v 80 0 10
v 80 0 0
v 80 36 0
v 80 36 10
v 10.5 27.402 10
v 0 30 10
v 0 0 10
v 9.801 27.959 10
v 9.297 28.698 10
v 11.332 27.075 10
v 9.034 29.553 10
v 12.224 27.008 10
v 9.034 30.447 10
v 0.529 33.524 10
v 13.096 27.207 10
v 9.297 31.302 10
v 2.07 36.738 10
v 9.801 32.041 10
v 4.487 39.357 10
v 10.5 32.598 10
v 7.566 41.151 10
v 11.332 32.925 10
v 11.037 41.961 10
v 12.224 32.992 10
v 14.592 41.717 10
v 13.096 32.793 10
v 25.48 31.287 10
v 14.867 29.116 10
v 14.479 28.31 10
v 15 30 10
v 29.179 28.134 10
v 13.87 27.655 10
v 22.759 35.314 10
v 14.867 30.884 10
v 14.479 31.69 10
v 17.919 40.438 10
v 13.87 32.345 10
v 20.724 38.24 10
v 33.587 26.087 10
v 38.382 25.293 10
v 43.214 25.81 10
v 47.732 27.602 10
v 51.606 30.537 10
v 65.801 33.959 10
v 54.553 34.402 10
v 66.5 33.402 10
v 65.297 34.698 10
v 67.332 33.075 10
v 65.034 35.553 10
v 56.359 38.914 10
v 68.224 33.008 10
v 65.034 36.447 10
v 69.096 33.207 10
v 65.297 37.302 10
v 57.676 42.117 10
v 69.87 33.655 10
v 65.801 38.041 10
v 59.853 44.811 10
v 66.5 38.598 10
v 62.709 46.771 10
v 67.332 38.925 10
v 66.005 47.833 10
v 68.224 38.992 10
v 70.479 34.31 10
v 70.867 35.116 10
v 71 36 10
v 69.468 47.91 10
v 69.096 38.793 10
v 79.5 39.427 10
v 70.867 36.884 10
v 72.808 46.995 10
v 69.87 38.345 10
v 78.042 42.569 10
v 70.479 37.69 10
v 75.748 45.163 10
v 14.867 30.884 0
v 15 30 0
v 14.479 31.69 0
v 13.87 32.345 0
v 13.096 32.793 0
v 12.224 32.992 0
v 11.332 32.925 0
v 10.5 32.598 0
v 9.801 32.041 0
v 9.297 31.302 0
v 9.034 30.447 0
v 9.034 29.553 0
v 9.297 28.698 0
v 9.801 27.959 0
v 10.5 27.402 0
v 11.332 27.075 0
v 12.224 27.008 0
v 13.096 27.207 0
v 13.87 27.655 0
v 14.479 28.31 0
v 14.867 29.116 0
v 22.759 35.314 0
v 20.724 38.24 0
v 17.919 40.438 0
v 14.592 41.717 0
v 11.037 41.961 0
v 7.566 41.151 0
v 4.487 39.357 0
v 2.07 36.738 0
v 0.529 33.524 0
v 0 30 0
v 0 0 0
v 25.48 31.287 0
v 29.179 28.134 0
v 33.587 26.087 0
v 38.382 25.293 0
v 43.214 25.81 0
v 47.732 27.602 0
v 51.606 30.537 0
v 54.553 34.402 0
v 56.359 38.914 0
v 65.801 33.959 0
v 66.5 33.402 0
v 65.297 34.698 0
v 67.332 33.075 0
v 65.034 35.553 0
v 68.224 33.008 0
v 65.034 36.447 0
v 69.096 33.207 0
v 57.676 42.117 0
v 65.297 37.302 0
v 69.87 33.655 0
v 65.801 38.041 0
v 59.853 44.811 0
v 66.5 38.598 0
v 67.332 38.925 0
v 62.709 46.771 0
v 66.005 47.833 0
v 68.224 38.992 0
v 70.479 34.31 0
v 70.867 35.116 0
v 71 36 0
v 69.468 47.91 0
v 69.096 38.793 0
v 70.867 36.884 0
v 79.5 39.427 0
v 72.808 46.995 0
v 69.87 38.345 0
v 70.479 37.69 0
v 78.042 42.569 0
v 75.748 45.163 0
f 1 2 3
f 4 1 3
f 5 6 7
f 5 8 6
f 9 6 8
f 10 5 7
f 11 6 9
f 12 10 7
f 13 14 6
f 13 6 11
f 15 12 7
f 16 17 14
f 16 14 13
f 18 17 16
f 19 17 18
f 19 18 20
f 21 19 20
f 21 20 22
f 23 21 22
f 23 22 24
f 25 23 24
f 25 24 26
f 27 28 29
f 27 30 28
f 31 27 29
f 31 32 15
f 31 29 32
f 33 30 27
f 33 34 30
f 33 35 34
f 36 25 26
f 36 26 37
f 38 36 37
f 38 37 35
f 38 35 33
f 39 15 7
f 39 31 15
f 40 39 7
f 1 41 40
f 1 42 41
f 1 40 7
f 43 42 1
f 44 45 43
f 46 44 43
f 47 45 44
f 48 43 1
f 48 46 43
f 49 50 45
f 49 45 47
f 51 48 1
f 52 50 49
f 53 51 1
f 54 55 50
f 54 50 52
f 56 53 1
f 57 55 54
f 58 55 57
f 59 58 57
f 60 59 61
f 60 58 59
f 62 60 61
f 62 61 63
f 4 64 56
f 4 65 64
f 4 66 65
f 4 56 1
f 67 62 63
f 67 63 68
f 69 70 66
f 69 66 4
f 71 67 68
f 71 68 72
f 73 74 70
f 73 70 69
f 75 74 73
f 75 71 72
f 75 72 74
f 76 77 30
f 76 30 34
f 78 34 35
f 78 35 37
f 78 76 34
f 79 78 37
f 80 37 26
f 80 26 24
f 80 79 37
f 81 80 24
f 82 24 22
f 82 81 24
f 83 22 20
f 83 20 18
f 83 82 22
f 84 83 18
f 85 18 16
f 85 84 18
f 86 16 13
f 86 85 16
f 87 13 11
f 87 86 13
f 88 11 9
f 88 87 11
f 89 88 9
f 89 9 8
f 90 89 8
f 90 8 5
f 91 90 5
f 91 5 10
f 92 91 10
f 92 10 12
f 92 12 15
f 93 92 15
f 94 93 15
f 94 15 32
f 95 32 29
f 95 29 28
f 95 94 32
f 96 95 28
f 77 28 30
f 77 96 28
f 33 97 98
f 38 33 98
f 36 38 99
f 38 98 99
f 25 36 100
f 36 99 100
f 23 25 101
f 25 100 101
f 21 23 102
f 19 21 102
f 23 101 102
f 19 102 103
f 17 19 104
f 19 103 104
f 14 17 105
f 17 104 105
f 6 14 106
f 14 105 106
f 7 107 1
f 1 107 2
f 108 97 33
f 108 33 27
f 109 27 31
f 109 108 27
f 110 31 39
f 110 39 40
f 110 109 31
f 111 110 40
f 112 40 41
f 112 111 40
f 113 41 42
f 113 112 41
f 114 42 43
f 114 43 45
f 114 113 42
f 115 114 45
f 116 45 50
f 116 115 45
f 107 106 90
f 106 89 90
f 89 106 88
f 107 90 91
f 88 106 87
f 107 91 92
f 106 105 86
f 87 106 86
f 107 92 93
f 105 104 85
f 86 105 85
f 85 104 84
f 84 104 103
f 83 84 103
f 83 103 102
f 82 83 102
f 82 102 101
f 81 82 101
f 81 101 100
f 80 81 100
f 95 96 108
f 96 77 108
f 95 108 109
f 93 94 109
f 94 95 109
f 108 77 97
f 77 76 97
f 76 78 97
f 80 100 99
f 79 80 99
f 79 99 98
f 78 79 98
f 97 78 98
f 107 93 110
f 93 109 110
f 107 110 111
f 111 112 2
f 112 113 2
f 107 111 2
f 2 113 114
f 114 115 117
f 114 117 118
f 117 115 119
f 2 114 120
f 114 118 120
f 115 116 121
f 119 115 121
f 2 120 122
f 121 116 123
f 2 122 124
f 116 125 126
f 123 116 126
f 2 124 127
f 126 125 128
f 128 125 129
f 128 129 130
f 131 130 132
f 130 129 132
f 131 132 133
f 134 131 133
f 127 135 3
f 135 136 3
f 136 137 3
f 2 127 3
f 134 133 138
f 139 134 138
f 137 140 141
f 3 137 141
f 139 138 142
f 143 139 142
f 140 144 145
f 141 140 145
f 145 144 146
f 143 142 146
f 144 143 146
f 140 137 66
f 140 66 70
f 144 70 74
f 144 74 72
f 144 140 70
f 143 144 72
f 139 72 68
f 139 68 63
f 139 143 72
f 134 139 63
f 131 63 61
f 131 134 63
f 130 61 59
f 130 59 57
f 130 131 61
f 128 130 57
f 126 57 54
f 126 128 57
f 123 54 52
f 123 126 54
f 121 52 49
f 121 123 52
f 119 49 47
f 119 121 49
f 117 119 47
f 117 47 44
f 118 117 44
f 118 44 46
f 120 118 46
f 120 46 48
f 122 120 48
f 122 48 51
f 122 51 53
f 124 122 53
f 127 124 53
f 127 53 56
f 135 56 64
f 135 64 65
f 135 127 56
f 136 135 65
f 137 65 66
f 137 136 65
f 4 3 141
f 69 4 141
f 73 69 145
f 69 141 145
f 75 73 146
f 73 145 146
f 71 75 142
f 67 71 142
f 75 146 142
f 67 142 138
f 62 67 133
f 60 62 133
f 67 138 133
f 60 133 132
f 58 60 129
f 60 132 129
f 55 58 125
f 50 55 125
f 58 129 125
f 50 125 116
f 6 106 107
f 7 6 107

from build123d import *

# Parameters (mm, degrees)
SKETCH_R  = 3
PAD_DEPTH = 10


with BuildPart() as part:
    # Sketch → Pad (new body)
    with BuildSketch(Plane.XY):
        with BuildLine():
            Line((0, 0), (80, 0))
            Line((80, 0), (80, 36))
            ThreePointArc((80, 36), (69.46807, 47.90986), (56.359205, 38.914086))
            ThreePointArc((22.759205, 35.314086), (40.815609, 25.387649), (56.359205, 38.914086))
            ThreePointArc((22.759205, 35.314086), (9.27149, 41.685685), (0, 30))
            Line((0, 30), (0, 0))
        make_face()
        with Locations((68, 36)):
            Circle(SKETCH_R, mode=Mode.SUBTRACT)
        with Locations((12, 30)):
            Circle(SKETCH_R, mode=Mode.SUBTRACT)
    extrude(amount=PAD_DEPTH)


solid = part.part
